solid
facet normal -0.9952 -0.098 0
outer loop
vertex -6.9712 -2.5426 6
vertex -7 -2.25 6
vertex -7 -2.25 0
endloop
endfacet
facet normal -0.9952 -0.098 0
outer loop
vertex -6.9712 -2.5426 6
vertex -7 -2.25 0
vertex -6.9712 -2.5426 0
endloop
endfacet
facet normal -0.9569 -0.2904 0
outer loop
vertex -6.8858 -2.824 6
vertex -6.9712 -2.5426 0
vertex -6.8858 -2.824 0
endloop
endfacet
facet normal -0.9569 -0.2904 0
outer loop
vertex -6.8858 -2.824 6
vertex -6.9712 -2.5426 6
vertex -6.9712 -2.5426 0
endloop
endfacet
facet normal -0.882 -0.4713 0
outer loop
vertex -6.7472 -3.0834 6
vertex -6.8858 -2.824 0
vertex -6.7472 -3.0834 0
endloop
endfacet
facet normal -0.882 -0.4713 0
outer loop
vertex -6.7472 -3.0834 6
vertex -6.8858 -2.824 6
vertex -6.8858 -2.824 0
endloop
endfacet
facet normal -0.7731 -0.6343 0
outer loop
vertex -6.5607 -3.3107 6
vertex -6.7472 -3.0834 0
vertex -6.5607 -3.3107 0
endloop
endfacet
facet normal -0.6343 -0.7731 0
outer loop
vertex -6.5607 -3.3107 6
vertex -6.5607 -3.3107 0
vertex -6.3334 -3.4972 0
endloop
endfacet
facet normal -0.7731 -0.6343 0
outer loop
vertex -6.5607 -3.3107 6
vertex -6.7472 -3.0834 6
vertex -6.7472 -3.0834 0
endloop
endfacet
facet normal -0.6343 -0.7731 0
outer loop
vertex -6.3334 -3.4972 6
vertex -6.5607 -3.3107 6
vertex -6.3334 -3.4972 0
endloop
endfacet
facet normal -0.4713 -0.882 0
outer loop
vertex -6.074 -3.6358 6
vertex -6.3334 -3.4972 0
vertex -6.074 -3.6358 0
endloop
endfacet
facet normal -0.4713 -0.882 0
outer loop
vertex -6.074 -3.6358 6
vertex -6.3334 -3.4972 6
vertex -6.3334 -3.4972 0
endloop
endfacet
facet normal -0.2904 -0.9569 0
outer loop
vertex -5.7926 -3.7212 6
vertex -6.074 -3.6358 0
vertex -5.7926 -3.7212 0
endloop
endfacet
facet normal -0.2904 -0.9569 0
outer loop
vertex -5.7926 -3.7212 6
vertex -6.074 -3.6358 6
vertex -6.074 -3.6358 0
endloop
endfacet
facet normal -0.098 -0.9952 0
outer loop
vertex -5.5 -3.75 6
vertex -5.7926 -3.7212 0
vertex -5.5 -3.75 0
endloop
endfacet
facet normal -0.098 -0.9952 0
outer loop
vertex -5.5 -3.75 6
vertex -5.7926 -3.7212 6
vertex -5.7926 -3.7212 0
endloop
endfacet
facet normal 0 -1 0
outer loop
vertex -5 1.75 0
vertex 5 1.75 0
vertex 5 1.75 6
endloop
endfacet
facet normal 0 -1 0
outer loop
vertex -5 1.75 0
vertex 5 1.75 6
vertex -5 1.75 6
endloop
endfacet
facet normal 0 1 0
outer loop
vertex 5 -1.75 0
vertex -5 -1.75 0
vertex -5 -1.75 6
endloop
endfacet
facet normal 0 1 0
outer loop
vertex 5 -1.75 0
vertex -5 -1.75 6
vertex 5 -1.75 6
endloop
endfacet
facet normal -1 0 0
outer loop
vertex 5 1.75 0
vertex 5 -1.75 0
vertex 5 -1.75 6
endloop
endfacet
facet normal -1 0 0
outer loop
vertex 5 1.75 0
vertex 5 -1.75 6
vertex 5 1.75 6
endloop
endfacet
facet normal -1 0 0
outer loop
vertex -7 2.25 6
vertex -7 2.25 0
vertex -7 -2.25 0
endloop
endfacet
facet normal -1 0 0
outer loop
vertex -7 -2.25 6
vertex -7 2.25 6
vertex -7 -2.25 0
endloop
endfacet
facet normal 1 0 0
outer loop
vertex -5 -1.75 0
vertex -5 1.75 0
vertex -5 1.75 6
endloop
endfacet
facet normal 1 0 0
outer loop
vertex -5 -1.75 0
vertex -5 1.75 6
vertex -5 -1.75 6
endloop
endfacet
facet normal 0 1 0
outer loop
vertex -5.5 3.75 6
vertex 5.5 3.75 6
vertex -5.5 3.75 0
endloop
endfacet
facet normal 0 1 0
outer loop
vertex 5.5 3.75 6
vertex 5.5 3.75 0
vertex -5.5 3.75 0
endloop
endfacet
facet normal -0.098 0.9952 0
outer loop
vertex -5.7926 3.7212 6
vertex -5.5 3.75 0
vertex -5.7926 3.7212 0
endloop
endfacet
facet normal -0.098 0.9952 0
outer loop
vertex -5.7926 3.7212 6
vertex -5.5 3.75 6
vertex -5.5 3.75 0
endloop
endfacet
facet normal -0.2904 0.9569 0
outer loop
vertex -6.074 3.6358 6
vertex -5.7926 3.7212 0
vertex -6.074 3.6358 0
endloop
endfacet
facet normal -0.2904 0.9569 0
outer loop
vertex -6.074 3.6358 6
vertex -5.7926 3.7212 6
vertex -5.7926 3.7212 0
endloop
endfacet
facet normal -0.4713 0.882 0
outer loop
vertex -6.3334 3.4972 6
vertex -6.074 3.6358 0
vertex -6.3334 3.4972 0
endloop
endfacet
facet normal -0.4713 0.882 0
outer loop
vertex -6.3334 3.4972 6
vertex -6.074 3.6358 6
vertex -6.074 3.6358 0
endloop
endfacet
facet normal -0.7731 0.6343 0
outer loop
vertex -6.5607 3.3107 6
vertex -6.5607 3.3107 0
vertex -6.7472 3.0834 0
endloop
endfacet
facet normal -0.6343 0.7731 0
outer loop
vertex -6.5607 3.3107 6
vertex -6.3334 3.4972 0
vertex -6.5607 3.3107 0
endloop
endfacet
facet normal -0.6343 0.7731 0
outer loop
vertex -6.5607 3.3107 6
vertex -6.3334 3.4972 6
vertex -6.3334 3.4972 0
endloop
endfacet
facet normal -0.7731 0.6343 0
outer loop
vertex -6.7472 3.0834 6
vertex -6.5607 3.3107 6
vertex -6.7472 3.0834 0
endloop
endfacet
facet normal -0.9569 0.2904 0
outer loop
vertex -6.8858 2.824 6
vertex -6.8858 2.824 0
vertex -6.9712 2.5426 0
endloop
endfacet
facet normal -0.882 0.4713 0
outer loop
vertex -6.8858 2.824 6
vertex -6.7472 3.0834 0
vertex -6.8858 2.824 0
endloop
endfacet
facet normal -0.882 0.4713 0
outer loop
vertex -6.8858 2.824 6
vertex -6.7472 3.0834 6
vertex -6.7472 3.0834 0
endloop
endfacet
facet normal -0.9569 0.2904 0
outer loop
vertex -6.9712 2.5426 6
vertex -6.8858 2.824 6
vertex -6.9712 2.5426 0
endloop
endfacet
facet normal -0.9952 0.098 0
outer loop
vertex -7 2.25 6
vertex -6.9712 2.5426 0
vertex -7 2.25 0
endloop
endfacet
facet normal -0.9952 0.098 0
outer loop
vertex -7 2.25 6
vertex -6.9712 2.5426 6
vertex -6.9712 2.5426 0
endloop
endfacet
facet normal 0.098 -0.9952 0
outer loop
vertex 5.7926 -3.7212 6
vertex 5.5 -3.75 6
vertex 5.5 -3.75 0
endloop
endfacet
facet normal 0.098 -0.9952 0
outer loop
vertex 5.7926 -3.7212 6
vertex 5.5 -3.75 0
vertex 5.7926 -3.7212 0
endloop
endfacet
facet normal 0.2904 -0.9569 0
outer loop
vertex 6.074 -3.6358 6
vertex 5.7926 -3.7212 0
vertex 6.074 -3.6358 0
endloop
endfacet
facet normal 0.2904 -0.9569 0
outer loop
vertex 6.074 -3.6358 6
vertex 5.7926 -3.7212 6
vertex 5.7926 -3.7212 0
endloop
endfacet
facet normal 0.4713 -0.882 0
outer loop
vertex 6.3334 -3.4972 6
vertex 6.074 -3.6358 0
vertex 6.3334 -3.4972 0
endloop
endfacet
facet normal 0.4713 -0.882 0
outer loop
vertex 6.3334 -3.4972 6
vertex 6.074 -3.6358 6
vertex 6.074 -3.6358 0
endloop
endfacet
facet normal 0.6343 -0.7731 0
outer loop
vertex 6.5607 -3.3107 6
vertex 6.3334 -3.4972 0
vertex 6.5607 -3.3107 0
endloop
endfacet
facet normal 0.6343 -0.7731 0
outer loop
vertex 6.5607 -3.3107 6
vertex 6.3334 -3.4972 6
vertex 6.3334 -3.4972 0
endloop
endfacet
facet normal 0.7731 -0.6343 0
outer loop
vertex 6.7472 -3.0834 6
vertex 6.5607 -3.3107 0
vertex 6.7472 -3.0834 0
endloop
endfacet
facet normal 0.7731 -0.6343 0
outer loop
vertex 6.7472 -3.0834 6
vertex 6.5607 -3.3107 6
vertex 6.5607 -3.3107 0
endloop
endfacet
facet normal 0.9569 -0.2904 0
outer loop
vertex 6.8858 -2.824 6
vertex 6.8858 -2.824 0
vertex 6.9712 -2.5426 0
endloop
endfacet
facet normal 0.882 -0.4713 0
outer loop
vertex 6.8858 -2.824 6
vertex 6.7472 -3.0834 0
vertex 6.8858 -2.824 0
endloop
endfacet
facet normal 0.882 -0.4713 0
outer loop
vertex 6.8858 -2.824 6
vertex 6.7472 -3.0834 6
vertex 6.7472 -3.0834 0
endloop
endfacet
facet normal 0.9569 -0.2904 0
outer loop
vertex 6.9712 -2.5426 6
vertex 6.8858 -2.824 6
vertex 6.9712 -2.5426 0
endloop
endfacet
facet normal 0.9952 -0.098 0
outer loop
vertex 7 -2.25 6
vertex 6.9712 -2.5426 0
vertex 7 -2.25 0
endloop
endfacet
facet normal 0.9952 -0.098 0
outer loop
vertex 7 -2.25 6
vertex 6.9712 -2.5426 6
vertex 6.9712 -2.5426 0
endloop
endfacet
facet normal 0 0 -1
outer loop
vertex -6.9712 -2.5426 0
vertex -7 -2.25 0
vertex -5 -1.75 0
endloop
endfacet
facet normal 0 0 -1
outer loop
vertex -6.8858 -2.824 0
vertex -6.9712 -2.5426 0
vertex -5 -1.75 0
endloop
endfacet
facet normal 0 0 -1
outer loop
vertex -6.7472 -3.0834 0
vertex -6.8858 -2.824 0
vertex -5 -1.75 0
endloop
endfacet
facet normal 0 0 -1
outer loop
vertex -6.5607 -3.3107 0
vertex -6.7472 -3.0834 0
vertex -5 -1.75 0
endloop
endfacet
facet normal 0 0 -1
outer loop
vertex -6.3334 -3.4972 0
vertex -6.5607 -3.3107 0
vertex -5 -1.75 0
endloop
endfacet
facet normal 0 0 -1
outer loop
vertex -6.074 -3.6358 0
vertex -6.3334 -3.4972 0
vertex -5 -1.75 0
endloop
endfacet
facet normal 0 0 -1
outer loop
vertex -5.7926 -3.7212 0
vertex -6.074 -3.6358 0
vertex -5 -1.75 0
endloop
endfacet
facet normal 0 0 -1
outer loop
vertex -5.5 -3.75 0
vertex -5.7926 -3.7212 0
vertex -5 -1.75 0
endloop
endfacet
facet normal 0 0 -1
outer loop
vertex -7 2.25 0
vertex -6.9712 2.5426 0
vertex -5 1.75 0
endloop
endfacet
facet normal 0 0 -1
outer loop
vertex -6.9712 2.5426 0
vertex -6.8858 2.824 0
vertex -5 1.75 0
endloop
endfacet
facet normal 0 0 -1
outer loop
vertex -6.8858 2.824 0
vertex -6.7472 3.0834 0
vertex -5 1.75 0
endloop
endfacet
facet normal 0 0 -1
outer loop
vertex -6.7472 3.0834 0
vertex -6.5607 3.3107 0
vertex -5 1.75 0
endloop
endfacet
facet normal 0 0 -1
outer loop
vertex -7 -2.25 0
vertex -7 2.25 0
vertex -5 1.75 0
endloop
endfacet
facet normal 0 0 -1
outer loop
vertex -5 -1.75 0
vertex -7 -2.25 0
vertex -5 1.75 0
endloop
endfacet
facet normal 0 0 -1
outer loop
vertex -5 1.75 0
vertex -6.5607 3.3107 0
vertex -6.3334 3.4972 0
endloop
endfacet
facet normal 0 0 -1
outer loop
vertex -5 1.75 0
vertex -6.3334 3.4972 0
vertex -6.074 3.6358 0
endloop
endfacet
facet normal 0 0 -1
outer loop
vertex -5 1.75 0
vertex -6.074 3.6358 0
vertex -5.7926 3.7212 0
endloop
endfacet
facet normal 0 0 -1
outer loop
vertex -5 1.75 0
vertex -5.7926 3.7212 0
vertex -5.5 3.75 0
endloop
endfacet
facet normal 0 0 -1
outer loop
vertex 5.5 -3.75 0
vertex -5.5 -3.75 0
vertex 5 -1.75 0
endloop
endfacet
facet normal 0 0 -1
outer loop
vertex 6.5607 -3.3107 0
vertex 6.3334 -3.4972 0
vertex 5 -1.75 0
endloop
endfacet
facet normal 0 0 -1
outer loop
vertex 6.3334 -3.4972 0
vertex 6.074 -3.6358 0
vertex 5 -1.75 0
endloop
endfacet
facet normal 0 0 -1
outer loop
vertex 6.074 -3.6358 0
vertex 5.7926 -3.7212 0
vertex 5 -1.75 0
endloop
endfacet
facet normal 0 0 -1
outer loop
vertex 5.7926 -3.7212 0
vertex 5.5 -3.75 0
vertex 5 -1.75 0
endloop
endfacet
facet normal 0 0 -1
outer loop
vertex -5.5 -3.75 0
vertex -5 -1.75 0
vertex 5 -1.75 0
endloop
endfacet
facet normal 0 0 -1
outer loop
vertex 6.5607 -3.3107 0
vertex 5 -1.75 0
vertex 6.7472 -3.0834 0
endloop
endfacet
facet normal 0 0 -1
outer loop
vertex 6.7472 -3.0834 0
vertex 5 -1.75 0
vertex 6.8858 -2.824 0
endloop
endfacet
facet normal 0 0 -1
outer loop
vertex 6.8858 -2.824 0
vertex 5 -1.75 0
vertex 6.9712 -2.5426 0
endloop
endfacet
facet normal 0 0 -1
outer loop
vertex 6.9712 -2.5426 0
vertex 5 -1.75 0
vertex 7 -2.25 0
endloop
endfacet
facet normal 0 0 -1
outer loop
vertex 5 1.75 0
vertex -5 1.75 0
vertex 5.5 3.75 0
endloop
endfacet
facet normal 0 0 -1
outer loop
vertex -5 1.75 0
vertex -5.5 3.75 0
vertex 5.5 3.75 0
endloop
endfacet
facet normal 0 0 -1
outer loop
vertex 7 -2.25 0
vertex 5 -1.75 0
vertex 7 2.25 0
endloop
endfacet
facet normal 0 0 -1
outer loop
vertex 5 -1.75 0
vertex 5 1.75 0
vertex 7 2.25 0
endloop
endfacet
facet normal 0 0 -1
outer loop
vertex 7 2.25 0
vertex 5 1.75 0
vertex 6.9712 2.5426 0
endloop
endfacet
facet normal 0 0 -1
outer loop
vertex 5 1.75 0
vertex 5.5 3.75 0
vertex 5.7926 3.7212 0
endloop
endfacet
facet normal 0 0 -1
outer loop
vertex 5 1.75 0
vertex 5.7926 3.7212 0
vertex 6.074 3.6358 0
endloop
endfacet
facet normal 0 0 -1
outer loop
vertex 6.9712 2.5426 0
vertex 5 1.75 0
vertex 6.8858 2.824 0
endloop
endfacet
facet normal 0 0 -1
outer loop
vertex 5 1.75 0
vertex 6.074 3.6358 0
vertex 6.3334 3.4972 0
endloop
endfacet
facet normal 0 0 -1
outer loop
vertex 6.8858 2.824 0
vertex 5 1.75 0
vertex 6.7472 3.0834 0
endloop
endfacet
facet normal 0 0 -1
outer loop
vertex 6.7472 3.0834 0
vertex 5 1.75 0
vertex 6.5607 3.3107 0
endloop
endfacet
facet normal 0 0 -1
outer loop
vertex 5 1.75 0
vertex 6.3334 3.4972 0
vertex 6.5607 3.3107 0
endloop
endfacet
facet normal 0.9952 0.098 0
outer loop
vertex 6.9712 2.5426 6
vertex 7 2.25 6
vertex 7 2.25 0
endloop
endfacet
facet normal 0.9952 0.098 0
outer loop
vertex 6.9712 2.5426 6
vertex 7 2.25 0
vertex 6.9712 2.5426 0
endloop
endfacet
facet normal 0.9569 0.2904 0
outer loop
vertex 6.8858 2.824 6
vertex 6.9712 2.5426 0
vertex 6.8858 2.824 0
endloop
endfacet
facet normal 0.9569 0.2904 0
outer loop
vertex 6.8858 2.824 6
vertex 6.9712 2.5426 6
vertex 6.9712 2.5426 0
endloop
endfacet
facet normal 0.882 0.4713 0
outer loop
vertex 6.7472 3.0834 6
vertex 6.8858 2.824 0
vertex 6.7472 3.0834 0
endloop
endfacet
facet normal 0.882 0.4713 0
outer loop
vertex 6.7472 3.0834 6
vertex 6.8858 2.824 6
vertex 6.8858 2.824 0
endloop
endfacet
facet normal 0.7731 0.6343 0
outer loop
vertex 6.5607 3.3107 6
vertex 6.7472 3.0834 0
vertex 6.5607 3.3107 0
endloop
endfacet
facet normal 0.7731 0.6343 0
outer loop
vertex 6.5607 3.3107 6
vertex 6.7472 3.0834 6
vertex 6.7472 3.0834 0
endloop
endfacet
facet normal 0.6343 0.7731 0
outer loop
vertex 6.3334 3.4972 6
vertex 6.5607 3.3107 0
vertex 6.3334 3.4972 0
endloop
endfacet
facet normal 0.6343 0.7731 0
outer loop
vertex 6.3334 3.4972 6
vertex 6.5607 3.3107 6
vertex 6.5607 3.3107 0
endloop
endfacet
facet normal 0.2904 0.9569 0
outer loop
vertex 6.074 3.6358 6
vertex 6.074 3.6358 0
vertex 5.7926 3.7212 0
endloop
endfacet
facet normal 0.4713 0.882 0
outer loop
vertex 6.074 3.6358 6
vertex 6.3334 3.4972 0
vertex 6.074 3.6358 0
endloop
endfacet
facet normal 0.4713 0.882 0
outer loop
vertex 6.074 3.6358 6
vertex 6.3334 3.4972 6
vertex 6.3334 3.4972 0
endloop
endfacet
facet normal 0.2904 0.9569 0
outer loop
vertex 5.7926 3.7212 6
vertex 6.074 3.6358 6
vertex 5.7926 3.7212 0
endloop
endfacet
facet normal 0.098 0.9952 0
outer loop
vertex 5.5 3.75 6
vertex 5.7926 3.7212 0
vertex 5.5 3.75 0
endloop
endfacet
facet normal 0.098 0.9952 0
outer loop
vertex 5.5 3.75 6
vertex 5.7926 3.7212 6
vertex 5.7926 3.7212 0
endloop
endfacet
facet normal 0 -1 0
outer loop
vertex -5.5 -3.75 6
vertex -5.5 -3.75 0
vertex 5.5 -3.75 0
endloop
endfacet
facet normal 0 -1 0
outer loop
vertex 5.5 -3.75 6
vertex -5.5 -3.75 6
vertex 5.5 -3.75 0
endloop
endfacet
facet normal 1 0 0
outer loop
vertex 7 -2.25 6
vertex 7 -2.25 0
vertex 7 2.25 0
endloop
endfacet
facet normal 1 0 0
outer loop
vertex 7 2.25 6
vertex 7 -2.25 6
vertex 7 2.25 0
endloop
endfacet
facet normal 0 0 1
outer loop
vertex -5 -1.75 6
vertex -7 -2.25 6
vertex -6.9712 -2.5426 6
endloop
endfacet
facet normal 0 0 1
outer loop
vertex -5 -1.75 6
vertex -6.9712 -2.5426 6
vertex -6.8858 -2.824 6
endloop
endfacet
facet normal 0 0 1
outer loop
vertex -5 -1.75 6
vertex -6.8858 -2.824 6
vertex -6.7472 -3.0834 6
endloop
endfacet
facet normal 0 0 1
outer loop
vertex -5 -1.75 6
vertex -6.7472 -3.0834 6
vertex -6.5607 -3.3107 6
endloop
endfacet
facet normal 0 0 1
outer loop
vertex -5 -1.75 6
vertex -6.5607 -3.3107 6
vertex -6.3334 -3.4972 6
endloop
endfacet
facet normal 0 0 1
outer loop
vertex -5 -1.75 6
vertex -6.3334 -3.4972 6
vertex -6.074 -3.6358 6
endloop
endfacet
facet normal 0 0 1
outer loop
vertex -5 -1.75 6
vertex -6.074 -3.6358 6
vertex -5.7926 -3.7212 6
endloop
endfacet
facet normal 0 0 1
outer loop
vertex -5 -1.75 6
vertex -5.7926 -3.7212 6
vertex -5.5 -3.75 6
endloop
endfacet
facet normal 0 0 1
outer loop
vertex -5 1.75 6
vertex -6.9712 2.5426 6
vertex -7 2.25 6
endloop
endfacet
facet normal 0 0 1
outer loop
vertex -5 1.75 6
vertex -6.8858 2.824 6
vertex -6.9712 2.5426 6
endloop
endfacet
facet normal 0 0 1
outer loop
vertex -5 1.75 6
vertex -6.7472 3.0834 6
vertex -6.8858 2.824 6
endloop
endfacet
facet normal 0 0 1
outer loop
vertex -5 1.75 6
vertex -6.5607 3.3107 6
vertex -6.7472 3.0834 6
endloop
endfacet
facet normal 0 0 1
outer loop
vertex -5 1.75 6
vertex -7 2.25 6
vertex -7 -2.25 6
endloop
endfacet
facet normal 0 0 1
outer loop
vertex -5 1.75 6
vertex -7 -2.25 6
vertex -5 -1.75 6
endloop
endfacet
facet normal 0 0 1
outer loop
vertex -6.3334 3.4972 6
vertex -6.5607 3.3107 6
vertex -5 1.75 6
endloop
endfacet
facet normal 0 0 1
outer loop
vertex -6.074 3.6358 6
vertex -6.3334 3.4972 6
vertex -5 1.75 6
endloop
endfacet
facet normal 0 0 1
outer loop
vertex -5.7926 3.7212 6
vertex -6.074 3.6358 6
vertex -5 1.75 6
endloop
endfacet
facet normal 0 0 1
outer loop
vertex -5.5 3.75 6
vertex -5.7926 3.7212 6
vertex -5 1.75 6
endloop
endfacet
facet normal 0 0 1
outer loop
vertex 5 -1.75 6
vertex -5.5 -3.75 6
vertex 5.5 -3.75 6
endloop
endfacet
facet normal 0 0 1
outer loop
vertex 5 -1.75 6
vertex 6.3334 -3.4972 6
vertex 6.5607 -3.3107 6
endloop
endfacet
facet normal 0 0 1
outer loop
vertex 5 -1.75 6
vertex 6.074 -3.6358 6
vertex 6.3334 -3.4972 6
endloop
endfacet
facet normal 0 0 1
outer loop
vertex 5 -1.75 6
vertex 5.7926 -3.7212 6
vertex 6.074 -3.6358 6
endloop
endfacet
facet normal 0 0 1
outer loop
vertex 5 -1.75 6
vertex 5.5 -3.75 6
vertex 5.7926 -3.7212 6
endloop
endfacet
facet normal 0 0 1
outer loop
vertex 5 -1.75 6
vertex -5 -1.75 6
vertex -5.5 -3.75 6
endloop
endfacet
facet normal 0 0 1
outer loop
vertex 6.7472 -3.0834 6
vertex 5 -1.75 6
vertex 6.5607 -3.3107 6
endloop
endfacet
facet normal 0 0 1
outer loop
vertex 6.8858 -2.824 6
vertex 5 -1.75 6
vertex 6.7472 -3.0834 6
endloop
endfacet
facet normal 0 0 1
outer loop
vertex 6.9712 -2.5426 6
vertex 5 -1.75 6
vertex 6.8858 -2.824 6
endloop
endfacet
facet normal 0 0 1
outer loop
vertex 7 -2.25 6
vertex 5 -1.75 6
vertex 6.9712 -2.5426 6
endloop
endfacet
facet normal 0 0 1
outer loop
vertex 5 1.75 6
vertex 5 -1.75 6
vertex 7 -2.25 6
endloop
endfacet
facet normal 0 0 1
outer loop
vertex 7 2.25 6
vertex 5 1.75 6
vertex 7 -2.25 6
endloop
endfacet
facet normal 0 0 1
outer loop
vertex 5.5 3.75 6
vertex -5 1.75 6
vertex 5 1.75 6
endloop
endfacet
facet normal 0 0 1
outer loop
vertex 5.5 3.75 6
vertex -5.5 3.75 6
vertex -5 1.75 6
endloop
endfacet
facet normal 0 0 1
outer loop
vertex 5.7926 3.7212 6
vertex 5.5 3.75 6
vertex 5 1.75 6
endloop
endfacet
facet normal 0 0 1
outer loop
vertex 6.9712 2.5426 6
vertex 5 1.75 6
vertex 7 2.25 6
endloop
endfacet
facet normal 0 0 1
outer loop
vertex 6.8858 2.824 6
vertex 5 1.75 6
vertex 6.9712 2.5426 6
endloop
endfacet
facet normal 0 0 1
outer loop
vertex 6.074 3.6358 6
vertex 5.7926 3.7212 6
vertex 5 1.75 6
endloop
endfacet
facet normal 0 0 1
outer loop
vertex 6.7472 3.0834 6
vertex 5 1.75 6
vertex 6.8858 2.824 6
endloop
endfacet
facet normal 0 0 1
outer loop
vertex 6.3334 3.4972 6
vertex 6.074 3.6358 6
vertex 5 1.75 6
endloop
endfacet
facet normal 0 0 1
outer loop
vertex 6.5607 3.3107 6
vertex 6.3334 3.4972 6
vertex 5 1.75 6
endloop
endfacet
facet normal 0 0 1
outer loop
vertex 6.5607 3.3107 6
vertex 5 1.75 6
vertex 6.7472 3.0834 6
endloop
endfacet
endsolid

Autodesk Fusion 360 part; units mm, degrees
sketch "Sketch1" plane through (0, 0, 0) normal (0, 0, 1) x (1, 0, 0)
  line L0 (5, 1.75) -> (-5, 1.75)
  line L1 (-5, 1.75) -> (-5, -1.75)
  line L2 (-5, -1.75) -> (5, -1.75)
  line L3 (5, -1.75) -> (5, 1.75)
  line L4 (5, 1.75) -> (-5, -1.75) construction
  line L5 (-5, 1.75) -> (5, -1.75) construction
  line L6 (-7, -3.75) -> (7, -3.75)
  line L7 (7, -3.75) -> (7, 3.75)
  line L8 (7, 3.75) -> (-7, 3.75)
  line L9 (-7, 3.75) -> (-7, -3.75)
  dimension "d1" = 10
  dimension "d2" = 3.5
  dimension "d3" = 2
extrude "Extrude1" add sketch "Sketch1" along normal blind 6
fillet "Fillet2" radius 1.5 4 edges at (7, 3.75, 3) (-7, 3.75, 3) (-7, -3.75, 3) (7, -3.75, 3)
